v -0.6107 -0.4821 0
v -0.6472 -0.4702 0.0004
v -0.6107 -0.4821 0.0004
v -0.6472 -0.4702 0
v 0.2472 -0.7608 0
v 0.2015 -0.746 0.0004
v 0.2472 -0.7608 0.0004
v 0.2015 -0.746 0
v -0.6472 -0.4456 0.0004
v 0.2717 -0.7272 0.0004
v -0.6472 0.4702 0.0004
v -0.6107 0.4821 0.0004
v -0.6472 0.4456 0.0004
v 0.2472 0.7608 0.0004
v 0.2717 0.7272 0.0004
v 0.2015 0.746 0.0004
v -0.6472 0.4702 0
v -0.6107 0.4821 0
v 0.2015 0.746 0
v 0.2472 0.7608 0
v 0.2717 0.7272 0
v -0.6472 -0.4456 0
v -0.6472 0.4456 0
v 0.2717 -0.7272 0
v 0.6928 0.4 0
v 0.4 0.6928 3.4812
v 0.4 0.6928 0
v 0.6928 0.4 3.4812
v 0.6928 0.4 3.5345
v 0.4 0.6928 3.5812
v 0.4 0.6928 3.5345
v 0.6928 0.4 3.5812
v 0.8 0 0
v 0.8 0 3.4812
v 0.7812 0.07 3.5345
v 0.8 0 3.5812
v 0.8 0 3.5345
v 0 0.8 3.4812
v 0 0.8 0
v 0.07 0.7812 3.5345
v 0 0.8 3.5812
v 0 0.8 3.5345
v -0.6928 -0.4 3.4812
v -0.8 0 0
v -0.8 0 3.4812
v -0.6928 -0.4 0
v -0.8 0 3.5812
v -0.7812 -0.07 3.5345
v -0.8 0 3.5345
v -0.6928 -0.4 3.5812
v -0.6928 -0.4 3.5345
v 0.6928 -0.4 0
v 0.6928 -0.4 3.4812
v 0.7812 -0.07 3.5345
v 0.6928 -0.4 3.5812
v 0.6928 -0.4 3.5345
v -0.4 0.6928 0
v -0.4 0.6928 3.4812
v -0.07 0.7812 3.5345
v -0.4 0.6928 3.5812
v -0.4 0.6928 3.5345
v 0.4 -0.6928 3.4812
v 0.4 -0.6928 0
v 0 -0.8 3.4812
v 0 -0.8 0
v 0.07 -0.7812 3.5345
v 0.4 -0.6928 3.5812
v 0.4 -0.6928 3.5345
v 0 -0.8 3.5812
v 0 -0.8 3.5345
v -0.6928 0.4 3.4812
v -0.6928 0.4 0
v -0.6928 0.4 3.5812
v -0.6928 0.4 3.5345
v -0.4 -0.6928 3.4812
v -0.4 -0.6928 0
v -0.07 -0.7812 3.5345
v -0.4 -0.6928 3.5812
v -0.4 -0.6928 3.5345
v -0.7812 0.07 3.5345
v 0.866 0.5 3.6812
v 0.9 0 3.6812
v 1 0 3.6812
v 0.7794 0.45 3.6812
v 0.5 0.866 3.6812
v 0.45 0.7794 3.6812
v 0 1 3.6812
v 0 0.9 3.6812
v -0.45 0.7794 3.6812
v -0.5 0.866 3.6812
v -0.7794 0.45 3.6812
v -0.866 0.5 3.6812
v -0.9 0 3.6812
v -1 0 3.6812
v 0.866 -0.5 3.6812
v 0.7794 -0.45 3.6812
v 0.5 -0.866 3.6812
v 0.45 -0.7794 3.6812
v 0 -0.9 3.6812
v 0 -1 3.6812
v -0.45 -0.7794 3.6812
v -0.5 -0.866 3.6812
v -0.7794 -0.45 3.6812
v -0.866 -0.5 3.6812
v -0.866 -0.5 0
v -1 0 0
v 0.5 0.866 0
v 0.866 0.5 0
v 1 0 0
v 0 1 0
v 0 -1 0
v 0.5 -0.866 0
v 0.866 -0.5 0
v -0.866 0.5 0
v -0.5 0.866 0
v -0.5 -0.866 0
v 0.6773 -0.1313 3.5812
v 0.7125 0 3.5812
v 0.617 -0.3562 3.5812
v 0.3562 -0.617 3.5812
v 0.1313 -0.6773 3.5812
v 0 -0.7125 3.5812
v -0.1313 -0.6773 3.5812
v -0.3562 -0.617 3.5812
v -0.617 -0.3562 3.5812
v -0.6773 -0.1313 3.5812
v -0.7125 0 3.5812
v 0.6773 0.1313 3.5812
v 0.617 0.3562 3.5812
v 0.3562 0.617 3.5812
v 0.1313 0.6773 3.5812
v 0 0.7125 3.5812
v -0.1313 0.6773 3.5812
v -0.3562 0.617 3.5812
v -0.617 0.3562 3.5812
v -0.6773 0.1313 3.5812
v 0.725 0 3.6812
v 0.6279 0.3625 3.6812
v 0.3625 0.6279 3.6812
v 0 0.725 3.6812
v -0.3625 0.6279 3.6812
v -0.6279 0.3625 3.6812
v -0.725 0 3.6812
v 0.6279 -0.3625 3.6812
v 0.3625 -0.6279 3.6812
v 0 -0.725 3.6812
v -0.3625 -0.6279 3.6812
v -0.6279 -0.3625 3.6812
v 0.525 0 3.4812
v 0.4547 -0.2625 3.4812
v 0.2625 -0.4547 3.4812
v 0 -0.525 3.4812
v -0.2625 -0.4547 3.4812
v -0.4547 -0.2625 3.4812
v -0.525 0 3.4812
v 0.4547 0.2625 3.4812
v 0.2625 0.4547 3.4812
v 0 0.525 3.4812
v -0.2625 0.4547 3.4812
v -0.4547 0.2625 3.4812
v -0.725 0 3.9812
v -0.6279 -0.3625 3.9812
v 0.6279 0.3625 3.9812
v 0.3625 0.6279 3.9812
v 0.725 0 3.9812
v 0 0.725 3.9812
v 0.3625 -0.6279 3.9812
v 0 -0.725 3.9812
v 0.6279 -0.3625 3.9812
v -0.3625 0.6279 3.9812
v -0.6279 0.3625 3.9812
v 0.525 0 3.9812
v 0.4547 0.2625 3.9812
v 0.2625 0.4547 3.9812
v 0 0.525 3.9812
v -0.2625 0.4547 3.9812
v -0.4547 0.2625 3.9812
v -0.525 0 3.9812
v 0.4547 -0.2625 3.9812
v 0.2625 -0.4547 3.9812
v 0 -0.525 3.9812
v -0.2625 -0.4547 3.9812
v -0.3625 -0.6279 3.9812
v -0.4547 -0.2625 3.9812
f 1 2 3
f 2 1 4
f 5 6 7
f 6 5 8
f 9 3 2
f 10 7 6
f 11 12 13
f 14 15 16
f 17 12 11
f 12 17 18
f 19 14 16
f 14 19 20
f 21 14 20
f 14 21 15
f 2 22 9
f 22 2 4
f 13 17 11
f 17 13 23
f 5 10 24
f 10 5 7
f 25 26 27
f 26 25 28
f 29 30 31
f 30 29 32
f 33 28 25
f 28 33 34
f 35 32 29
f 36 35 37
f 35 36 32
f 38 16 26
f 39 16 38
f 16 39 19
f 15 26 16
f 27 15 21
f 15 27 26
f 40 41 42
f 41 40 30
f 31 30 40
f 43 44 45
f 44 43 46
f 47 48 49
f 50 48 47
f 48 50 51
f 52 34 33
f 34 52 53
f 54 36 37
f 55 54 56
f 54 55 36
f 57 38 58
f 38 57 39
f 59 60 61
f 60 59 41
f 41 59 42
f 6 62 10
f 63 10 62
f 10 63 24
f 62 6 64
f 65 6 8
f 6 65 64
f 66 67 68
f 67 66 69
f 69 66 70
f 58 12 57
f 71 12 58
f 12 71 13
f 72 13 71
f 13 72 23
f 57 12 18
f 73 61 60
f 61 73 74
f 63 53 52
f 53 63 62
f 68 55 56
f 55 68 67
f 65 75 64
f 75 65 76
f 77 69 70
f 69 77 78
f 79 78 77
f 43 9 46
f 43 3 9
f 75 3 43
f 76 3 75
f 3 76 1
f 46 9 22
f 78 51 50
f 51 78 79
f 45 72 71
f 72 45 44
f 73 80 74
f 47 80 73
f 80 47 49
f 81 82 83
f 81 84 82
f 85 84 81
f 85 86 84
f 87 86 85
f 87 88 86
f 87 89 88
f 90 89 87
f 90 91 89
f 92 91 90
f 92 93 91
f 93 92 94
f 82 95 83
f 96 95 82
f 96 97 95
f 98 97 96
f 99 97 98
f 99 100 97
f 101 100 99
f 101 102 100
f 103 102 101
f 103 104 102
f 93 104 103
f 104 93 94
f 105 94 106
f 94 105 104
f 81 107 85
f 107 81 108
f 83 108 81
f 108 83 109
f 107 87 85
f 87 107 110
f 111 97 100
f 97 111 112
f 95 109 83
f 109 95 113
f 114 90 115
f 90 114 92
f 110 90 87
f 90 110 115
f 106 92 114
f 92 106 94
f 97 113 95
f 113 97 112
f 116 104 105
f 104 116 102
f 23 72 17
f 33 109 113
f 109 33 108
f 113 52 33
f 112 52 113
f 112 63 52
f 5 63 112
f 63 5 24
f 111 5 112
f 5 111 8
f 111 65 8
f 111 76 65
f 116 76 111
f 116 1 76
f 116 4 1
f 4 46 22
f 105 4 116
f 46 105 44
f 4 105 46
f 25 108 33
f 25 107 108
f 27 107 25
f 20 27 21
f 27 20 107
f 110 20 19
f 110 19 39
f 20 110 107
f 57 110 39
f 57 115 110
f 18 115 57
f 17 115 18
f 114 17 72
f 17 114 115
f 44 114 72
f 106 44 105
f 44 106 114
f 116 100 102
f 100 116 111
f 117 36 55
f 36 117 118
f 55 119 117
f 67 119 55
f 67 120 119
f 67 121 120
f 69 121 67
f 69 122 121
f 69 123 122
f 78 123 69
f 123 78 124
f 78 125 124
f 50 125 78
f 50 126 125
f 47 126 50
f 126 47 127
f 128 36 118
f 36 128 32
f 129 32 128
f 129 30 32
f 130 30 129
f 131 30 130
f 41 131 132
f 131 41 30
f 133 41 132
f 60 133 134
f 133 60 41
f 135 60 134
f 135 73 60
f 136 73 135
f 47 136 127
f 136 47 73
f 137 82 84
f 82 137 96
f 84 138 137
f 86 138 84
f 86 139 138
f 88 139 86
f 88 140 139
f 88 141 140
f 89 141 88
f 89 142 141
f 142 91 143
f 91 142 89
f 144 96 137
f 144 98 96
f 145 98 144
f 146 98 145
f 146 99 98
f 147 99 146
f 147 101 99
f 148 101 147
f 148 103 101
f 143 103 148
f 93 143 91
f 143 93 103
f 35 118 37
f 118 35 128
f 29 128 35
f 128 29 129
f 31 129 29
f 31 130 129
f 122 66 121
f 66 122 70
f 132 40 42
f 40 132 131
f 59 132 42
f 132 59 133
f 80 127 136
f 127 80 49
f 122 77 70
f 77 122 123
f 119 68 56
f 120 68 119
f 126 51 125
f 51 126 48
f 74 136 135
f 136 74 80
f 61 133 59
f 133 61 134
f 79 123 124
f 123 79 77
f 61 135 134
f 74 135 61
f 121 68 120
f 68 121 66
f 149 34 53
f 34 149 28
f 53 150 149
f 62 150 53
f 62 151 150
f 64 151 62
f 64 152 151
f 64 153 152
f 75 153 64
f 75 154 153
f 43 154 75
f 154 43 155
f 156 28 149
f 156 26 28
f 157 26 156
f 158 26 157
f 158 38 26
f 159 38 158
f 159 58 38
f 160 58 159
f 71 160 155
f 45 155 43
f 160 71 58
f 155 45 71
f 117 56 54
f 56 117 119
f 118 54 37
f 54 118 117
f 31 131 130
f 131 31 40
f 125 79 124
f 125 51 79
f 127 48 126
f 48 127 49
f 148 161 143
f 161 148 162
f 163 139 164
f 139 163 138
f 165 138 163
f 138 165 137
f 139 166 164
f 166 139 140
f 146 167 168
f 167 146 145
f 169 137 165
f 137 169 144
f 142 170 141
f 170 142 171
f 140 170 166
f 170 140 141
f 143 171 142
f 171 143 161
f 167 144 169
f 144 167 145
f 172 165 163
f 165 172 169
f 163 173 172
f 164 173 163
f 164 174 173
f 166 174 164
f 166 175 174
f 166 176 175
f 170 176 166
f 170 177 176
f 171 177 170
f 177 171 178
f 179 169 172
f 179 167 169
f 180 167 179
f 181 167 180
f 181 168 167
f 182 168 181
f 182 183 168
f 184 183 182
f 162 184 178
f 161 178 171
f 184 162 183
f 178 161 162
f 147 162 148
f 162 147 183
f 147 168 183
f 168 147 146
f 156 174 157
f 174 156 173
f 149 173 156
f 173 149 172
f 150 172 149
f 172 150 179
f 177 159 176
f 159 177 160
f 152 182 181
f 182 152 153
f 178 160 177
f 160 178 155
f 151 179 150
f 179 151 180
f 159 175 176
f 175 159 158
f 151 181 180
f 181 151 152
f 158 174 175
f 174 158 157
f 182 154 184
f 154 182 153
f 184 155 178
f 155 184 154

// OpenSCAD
tolerance=0.075;
hole_radius=0.075;
grid_hole_radius=0.075;
outer_radius=1;
thickness=0.2;
hole_attach_height=0.075;
attach_thickness=0.1;

//parameters that don't have to be defined explicitly
eps = tolerance/100;
inner_radius = outer_radius - thickness;
fn = 12;
fnh = 6;

module angled_cylinder(angle_deg_y, _h, _r, angle_deg_x = 0) {
    rotate([angle_deg_x, angle_deg_y, 0]) { // Rotate the cylinder 
            cylinder(h = _h, r = _r, center = true, $fn = fnh);
        }
}

module hole(_h) {
    cylinder(h = _h, r = grid_hole_radius, $fn = fnh);
}

//makes circle of holes
module circular_grid(_h, _r, _n) {
    for (i = [0:_n-1]) {
        angle = i * 360 / _n;
        x_pos = _r * cos(angle);
        y_pos = _r * sin(angle);
        translate([x_pos, y_pos, -eps]) {
            hole(_h);
        }
    }
}

//makes grid of holes
module hole_grid(hole_height, grid_h) {
    translate([0,0,hole_height]) {
        difference() {
            //cylinder
            cylinder(h = grid_h, r = (inner_radius + outer_radius)/2, 
                center=false, $fn = fn);
            //holes
            for (i = [0 : grid_hole_radius * 2 + hole_attach_height : inner_radius - grid_hole_radius * 2]) {
                circular_grid(grid_h + eps*2, i, ceil(6.28*i/(grid_hole_radius*4)));
            }
            
        } 
    }
}

//makes curve of CSC
module curve(_radius, _twist, _turning_angle, _turning_radius) {
    rotate([90,0,_twist])
    translate([-_turning_radius, 0, 0])
    rotate_extrude(angle=_turning_angle, convexity=100, $fn = fn)
    translate([_turning_radius, 0]) circle(_radius);
}

module CSC(_r, _t1, _ta1, _tr1, _h, _t2, _ta2, _tr2, is_inner) {
    
    if (_ta1 > 90) {
        CSC(_r, _t1, 90, _tr1, 0, 0, 0, 0, is_inner);
        
        pos1 = (-_tr1 + sqrt(_tr1*_tr1 - pow(_tr1,2)));
        translate([pos1*cos(_t1),pos1*sin(_t1),_tr1])
        rotate([0,-90,_t1])
        CSC(_r, 0, _ta1 - 90, _tr1, _h, _t2, _ta2, _tr2, is_inner);
    } else if (_ta2 > 90) {
        CSC(_r, _t1, _ta1, _tr1, _h, _t2, 90, _tr2, is_inner);
        
        pos1 = (-_tr1 + sqrt(_tr1*_tr1 - pow(_tr1*sin(_ta1),2)));
        pos2 = (-_tr2 + sqrt(_tr2*_tr2 - pow(_tr2,2)));
        translate([pos1*cos(_t1),pos1*sin(_t1),_tr1*sin(_ta1)])
        rotate([0,-_ta1,_t1])
        translate([0, 0, _h])
        translate([pos2*cos(_t2),pos2*sin(_t2),_tr2])
        rotate([0,-90,_t2])
        CSC(_r, 0, 0, 0, 0, 0, _ta2 - 90, _tr2, is_inner);
    } else {
        //intermediate positions
        pos1 = (-_tr1 + sqrt(_tr1*_tr1 - pow(_tr1*sin(_ta1),2)));
        pos2 = (-_tr2 + sqrt(_tr2*_tr2 - pow(_tr2*sin(_ta2),2)));
        
        union() {
            //bottom shell threshold
            if (is_inner) {
                cylinder(h=eps, r=_r, center=true);
            }
            
            //first curve of CSC
            curve(_r, _t1, _ta1, _tr1);
            
            //straight link of CSC
            translate([pos1*cos(_t1),pos1*sin(_t1),_tr1*sin(_ta1)])
            rotate([0,-_ta1,_t1])
            if (is_inner) {
                //add threshold for shelling
                translate([0,0,-eps /2])
                cylinder(h=_h + eps,r=_r, center = false, $fn= fn);
            } else {
                cylinder(h=_h,r=_r, center = false, $fn= fn);
            }
            
            //second curve of CSC
            translate([pos1*cos(_t1),pos1*sin(_t1),_tr1*sin(_ta1)])
            rotate([0,-_ta1,_t1])
            translate([0, 0, _h])
            curve(_r, _t2, _ta2, _tr2);
            
            //shelling thresholds
            if (is_inner) {
                translate([pos1*cos(_t1),pos1*sin(_t1),_tr1*sin(_ta1)])
                rotate([0,-_ta1,_t1])
                translate([0, 0, _h])
                translate([pos2*cos(_t2),pos2*sin(_t2),_tr2*sin(_ta2)])
                rotate([0,-_ta2,_t2]) {
                    cylinder(h=eps, r=_r, center=true,$fn=fn);
                }
            
            }
        }
    }
    
}

//allow modules to attach
module CSC_ATTACH(_r, _t1, _ta1, _tr1, _h, _t2, _ta2, _tr2, next_hole_radius, next_hole_attach_height, next_inner) {
    
    if (_ta1 > 90) {        
        pos1 = (-_tr1 + sqrt(_tr1*_tr1 - pow(_tr1,2)));
        translate([pos1*cos(_t1),pos1*sin(_t1),_tr1])
        rotate([0,-90,_t1])
        CSC_ATTACH(_r, 0, _ta1 - 90, _tr1, _h, _t2, _ta2, _tr2, next_hole_radius, next_hole_attach_height, next_inner);
    } else if (_ta2 > 90) {        
        pos1 = (-_tr1 + sqrt(_tr1*_tr1 - pow(_tr1*sin(_ta1),2)));
        pos2 = (-_tr2 + sqrt(_tr2*_tr2 - pow(_tr2,2)));
        translate([pos1*cos(_t1),pos1*sin(_t1),_tr1*sin(_ta1)])
        rotate([0,-_ta1,_t1])
        translate([0, 0, _h])
        translate([pos2*cos(_t2),pos2*sin(_t2),_tr2])
        rotate([0,-90,_t2])
        CSC_ATTACH(_r, 0, 0, 0, 0, 0, _ta2 - 90, _tr2, next_hole_radius, next_hole_attach_height, next_inner);
    } else {
        //intermediate positions
        pos1 = (-_tr1 + sqrt(_tr1*_tr1 - pow(_tr1*sin(_ta1),2)));
        pos2 = (-_tr2 + sqrt(_tr2*_tr2 - pow(_tr2*sin(_ta2),2)));
        
        translate([pos1*cos(_t1),pos1*sin(_t1),_tr1*sin(_ta1)])
        rotate([0,-_ta1,_t1])
        translate([0, 0, _h])
        translate([pos2*cos(_t2),pos2*sin(_t2),_tr2*sin(_ta2)])
        rotate([0,-_ta2,_t2]) {
            difference() {
                union() {
                    //attachment for smaller cylinder
                    translate([0,0,-attach_thickness])
                    cylinder(h=attach_thickness, r=_r - thickness/2, $fn=fn);
                    translate([0,0,-attach_thickness*2])
                    cylinder(h=attach_thickness*2, r1=_r - thickness/2, r2=next_inner - tolerance - thickness, $fn=fn);
                    
                    //small cylinder
                    cylinder(h=next_hole_radius*2 + next_hole_attach_height * 2, r = next_inner - tolerance, $fn=fn);
                }
                
                //shelling
                translate([0,0, -attach_thickness*2 - eps/2])
                cylinder(h=next_hole_radius*2 + next_hole_attach_height * 2 + attach_thickness*2 + eps, r = min(inner_radius, next_inner - tolerance - thickness), $fn=fn);
                
                //holes for screws
    //            translate([0,0,next_hole_attach_height + next_hole_radius]) {
    //                angled_cylinder(0, (next_inner + thickness + eps) * 2,  hole_radius, 90);
    //                angled_cylinder(90, (next_inner + thickness + eps) * 2, hole_radius, 0);
    //            }
            }
        }
    }
}

//remove overlap to allow all branches to attach to each other
module CSC_REMOVE_OVERLAP(_r, _t1, _ta1, _tr1, _h, _t2, _ta2, _tr2, next_hole_radius, next_hole_attach_height, next_inner) {
    if (_ta1 > 90) {        
        pos1 = (-_tr1 + sqrt(_tr1*_tr1 - pow(_tr1,2)));
        translate([pos1*cos(_t1),pos1*sin(_t1),_tr1])
        rotate([0,-90,_t1])
        CSC_REMOVE_OVERLAP(_r, 0, _ta1 - 90, _tr1, _h, _t2, _ta2, _tr2, next_hole_radius, next_hole_attach_height, next_inner);
    } else if (_ta2 > 90) {        
        pos1 = (-_tr1 + sqrt(_tr1*_tr1 - pow(_tr1*sin(_ta1),2)));
        pos2 = (-_tr2 + sqrt(_tr2*_tr2 - pow(_tr2,2)));
        translate([pos1*cos(_t1),pos1*sin(_t1),_tr1*sin(_ta1)])
        rotate([0,-_ta1,_t1])
        translate([0, 0, _h])
        translate([pos2*cos(_t2),pos2*sin(_t2),_tr2])
        rotate([0,-90,_t2])
        CSC_REMOVE_OVERLAP(_r, 0, 0, 0, 0, 0, _ta2 - 90, _tr2, next_hole_radius, next_hole_attach_height, next_inner);
    } else {
        pos1 = (-_tr1 + sqrt(_tr1*_tr1 - pow(_tr1*sin(_ta1),2)));
        pos2 = (-_tr2 + sqrt(_tr2*_tr2 - pow(_tr2*sin(_ta2),2)));
        
        translate([pos1*cos(_t1),pos1*sin(_t1),_tr1*sin(_ta1)])
        rotate([0,-_ta1,_t1])
        translate([0, 0, _h])
        translate([pos2*cos(_t2),pos2*sin(_t2),_tr2*sin(_ta2)])
        rotate([0,-_ta2,_t2]) {
            cylinder(h=999999, r=_r + tolerance, $fn=fn);
        }
    }
}

//c is _t1, _ta1, _tr1, _h, _t2, _ta2, _tr2, next hole radius, next hole height, next inner radius
module branch(branch_list, _outer, _inner) {
    union() {
        //make grid of holes
        //hole_grid(hole_radius*2 + hole_attach_height * 2, grid_hole_radius);
        
        //make CSC shells for each CSC in branch_list
        difference() {
            for (c = branch_list) {
                CSC(_outer,c[0],c[1],c[2],c[3],c[4],c[5],c[6], false);
            }
            
            for (c = branch_list) {
                CSC(_inner,c[0],c[1],c[2],c[3],c[4],c[5],c[6], true);
                CSC_REMOVE_OVERLAP(_outer,c[0],c[1],c[2],c[3],c[4],c[5],c[6],c[7], c[8], c[9]);
            }
            
            //make screw holes at the bottom
//            translate([0,0,hole_radius + hole_attach_height]) {
//                angled_cylinder(0, (outer_radius*1.5 + eps) * 2,  hole_radius, 90);
//                angled_cylinder(90, (outer_radius*1.5 + eps) * 2, hole_radius, 0);
//            }    
        }
        for (c=branch_list) {     
            CSC_ATTACH(_outer,c[0],c[1],c[2],c[3],c[4],c[5],c[6], c[7], c[8], c[9]);
        }
    }
}

branch([
[ 0.0, 0.0, 1.0*outer_radius, 3.6812*outer_radius, 0.0, 0.0, 1.0*outer_radius, 0.075, 0.075, 0.8],
],outer_radius,inner_radius);
